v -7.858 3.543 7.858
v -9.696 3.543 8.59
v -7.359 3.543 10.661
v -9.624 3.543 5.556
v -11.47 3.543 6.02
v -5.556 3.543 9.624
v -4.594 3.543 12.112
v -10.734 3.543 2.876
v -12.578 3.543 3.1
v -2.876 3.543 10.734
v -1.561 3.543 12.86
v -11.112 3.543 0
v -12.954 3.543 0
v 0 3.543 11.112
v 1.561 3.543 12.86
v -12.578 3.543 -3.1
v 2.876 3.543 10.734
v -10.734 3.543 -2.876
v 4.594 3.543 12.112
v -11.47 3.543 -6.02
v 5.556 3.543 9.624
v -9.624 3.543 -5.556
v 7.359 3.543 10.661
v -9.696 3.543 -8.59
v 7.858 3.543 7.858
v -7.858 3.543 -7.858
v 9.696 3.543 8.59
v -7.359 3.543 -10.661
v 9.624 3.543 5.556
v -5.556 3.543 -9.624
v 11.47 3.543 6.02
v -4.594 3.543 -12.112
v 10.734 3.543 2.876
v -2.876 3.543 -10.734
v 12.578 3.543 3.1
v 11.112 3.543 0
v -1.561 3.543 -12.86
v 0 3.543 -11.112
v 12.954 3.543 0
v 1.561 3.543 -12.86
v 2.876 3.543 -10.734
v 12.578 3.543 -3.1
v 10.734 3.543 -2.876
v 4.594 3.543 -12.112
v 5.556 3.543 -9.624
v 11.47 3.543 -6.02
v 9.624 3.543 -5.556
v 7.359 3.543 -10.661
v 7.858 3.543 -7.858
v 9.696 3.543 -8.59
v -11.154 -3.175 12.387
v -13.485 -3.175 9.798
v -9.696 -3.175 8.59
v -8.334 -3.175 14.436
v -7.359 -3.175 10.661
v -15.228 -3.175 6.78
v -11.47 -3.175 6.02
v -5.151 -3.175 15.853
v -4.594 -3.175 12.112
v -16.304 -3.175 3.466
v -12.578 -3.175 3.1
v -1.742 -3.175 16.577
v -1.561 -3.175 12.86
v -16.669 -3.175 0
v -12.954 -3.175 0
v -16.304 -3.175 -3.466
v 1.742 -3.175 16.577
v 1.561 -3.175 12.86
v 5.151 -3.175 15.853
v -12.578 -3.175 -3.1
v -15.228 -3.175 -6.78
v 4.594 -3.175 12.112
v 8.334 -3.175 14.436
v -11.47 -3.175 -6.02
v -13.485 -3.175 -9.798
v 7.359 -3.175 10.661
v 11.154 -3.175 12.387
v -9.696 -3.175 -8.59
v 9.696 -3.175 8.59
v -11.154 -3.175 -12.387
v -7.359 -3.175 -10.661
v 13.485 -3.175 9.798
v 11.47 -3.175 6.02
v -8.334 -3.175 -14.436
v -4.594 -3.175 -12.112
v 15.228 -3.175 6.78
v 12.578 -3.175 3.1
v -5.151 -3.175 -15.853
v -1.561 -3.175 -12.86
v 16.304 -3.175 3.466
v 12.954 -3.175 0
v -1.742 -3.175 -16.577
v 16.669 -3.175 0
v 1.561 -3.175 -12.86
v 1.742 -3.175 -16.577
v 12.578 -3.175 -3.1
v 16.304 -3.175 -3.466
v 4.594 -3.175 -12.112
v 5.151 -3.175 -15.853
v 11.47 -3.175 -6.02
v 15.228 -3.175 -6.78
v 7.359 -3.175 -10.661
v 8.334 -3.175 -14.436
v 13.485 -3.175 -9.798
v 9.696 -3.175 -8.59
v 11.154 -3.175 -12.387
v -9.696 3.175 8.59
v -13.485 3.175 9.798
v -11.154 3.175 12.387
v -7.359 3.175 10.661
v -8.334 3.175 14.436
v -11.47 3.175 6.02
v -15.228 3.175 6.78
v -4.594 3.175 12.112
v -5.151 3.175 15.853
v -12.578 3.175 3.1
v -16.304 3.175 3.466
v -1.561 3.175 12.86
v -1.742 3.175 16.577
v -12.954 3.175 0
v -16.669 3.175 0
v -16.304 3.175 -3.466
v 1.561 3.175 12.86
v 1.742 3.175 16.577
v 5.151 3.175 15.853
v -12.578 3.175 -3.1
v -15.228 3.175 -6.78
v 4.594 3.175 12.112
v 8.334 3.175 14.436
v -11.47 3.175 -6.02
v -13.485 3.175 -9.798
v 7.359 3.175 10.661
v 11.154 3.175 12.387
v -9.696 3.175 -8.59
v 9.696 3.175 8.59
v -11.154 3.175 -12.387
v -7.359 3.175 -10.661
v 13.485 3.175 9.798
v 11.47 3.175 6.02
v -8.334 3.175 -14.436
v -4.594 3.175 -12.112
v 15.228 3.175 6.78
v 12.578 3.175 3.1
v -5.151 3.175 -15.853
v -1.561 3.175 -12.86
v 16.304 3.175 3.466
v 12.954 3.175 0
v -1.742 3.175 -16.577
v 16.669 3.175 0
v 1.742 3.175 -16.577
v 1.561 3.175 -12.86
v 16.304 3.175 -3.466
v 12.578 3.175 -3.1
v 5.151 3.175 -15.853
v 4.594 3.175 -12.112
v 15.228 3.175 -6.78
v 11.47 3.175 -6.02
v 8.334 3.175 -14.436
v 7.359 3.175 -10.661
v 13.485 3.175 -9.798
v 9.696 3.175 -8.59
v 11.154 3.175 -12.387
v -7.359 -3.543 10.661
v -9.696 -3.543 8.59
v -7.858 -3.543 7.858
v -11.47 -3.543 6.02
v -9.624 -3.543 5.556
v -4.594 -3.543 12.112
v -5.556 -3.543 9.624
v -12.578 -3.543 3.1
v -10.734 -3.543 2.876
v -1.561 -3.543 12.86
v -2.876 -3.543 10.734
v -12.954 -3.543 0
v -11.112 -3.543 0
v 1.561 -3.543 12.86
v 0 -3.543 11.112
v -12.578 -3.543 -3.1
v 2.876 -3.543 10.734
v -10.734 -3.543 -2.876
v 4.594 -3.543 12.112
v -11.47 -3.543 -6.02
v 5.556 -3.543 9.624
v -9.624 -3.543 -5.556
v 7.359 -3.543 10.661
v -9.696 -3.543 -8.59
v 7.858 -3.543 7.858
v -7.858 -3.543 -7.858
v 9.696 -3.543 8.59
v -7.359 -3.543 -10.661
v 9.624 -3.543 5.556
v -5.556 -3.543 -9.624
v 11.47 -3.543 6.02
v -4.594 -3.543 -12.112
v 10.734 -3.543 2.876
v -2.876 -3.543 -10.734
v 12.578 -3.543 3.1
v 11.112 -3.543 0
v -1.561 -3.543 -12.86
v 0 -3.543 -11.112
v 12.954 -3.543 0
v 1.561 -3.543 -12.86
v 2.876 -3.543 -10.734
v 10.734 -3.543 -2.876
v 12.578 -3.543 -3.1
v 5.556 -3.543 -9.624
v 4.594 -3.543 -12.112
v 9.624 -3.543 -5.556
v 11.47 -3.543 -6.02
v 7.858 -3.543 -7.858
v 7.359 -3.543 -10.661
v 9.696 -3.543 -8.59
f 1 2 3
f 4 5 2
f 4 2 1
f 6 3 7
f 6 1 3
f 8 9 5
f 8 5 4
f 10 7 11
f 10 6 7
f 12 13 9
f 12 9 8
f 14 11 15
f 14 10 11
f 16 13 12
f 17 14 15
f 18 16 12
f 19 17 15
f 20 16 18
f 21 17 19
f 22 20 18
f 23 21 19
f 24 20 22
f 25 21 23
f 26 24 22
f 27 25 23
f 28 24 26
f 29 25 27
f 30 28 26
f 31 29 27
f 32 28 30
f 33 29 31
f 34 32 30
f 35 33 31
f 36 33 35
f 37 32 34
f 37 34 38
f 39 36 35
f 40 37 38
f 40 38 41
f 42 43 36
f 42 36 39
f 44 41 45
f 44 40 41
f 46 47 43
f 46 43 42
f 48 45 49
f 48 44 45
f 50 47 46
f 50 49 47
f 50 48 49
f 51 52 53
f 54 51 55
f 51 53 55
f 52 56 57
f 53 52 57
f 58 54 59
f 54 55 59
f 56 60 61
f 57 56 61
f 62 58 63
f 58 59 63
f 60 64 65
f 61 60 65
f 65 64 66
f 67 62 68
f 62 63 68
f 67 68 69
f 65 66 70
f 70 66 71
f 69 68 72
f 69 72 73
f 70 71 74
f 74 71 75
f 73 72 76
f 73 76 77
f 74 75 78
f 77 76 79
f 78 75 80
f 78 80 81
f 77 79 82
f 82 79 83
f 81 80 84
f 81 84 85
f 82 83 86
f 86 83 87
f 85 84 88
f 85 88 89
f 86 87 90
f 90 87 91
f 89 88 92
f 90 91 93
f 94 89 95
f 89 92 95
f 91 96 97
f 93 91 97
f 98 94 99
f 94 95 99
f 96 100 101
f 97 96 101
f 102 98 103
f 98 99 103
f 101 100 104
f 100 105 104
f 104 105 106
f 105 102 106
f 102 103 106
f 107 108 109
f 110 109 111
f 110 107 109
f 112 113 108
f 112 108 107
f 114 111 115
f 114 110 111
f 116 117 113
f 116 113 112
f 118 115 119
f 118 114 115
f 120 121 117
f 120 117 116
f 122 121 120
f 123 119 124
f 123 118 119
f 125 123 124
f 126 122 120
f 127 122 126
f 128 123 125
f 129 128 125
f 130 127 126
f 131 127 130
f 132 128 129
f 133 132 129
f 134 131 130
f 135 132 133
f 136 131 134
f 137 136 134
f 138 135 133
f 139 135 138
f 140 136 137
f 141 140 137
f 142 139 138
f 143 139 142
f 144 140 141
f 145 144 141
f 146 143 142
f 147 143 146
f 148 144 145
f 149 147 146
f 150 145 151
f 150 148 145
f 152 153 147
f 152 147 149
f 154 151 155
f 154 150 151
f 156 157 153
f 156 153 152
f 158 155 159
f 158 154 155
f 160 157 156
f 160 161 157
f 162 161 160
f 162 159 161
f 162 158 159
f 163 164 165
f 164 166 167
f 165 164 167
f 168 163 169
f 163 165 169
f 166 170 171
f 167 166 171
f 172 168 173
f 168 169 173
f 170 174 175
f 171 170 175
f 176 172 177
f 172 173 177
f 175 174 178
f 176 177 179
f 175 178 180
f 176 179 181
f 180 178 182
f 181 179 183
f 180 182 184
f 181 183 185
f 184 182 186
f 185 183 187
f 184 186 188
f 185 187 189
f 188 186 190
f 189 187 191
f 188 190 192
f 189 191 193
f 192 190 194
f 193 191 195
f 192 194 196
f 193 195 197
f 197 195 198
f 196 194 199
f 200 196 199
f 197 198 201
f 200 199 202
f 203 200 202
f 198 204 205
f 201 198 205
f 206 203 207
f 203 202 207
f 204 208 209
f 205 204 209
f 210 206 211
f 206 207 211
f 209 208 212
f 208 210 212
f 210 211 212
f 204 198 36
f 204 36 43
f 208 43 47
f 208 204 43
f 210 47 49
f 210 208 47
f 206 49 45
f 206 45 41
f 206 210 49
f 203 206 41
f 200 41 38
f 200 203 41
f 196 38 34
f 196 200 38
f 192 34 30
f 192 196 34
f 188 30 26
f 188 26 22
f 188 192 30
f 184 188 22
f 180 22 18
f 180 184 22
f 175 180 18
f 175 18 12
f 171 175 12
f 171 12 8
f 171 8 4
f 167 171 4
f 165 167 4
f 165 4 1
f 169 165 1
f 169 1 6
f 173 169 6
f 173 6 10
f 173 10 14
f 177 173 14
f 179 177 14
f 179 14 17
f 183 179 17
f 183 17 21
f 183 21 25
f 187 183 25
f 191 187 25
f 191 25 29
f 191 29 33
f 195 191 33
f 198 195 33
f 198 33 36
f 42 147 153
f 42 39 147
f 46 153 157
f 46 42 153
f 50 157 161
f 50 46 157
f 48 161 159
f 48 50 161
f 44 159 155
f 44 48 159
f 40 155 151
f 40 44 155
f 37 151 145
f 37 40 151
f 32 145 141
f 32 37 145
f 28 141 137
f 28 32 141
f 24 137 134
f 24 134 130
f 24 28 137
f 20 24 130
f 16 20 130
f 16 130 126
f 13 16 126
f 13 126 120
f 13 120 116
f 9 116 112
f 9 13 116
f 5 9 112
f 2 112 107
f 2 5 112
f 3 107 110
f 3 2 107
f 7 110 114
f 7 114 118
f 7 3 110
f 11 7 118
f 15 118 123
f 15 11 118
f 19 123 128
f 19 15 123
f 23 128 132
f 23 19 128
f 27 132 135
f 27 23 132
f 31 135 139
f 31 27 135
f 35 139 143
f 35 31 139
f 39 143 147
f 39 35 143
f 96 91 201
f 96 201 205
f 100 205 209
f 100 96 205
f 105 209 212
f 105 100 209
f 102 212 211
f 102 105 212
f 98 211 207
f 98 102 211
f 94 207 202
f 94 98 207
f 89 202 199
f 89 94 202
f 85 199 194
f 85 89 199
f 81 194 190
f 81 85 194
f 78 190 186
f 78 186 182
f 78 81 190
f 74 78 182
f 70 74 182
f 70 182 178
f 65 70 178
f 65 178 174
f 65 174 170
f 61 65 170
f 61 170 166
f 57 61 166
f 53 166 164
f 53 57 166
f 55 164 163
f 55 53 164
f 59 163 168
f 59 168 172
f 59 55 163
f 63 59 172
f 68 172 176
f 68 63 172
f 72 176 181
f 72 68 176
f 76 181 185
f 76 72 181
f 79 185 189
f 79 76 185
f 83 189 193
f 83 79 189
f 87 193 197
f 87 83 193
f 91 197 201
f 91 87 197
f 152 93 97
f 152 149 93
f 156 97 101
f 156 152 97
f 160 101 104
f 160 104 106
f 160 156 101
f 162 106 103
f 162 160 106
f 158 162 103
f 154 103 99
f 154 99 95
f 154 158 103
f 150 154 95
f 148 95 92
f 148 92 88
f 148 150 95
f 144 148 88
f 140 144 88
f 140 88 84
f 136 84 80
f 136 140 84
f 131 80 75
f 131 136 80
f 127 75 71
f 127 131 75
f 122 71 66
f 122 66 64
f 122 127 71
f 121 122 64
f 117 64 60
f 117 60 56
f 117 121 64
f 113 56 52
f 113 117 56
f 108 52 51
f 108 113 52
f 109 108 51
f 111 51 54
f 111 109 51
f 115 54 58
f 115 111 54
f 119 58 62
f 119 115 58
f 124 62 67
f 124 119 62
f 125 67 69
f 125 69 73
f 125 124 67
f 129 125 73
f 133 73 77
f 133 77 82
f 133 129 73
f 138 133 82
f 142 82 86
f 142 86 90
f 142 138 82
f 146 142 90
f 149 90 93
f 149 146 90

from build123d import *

# Parameters (mm, degrees)
SKETCH2_R           = 16.66875
SKETCH2_R_2         = 11.1125
BOSS_EXTRUDE1_DEPTH = 3.175
SKETCH2_3_R         = 12.954
SKETCH2_3_R_2       = 11.1125
BOSS_EXTRUDE2_DEPTH = 3.5433


with BuildPart() as part:
    # Sketch2 → Boss-Extrude1 (new, symmetric)
    with BuildSketch(Plane(origin=(0, 0, 0), x_dir=(1, 0, 0), z_dir=(0, 1, 0))):
        Circle(SKETCH2_R)
        Circle(SKETCH2_R_2, mode=Mode.SUBTRACT)
    extrude(amount=BOSS_EXTRUDE1_DEPTH, both=True)

    # Sketch2<3> → Boss-Extrude2 (add, symmetric)
    with BuildSketch(Plane(origin=(0, 0, 0), x_dir=(1, 0, 0), z_dir=(0, 1, 0))):
        Circle(SKETCH2_3_R)
        Circle(SKETCH2_3_R_2, mode=Mode.SUBTRACT)
    extrude(amount=BOSS_EXTRUDE2_DEPTH, both=True)


solid = part.part
